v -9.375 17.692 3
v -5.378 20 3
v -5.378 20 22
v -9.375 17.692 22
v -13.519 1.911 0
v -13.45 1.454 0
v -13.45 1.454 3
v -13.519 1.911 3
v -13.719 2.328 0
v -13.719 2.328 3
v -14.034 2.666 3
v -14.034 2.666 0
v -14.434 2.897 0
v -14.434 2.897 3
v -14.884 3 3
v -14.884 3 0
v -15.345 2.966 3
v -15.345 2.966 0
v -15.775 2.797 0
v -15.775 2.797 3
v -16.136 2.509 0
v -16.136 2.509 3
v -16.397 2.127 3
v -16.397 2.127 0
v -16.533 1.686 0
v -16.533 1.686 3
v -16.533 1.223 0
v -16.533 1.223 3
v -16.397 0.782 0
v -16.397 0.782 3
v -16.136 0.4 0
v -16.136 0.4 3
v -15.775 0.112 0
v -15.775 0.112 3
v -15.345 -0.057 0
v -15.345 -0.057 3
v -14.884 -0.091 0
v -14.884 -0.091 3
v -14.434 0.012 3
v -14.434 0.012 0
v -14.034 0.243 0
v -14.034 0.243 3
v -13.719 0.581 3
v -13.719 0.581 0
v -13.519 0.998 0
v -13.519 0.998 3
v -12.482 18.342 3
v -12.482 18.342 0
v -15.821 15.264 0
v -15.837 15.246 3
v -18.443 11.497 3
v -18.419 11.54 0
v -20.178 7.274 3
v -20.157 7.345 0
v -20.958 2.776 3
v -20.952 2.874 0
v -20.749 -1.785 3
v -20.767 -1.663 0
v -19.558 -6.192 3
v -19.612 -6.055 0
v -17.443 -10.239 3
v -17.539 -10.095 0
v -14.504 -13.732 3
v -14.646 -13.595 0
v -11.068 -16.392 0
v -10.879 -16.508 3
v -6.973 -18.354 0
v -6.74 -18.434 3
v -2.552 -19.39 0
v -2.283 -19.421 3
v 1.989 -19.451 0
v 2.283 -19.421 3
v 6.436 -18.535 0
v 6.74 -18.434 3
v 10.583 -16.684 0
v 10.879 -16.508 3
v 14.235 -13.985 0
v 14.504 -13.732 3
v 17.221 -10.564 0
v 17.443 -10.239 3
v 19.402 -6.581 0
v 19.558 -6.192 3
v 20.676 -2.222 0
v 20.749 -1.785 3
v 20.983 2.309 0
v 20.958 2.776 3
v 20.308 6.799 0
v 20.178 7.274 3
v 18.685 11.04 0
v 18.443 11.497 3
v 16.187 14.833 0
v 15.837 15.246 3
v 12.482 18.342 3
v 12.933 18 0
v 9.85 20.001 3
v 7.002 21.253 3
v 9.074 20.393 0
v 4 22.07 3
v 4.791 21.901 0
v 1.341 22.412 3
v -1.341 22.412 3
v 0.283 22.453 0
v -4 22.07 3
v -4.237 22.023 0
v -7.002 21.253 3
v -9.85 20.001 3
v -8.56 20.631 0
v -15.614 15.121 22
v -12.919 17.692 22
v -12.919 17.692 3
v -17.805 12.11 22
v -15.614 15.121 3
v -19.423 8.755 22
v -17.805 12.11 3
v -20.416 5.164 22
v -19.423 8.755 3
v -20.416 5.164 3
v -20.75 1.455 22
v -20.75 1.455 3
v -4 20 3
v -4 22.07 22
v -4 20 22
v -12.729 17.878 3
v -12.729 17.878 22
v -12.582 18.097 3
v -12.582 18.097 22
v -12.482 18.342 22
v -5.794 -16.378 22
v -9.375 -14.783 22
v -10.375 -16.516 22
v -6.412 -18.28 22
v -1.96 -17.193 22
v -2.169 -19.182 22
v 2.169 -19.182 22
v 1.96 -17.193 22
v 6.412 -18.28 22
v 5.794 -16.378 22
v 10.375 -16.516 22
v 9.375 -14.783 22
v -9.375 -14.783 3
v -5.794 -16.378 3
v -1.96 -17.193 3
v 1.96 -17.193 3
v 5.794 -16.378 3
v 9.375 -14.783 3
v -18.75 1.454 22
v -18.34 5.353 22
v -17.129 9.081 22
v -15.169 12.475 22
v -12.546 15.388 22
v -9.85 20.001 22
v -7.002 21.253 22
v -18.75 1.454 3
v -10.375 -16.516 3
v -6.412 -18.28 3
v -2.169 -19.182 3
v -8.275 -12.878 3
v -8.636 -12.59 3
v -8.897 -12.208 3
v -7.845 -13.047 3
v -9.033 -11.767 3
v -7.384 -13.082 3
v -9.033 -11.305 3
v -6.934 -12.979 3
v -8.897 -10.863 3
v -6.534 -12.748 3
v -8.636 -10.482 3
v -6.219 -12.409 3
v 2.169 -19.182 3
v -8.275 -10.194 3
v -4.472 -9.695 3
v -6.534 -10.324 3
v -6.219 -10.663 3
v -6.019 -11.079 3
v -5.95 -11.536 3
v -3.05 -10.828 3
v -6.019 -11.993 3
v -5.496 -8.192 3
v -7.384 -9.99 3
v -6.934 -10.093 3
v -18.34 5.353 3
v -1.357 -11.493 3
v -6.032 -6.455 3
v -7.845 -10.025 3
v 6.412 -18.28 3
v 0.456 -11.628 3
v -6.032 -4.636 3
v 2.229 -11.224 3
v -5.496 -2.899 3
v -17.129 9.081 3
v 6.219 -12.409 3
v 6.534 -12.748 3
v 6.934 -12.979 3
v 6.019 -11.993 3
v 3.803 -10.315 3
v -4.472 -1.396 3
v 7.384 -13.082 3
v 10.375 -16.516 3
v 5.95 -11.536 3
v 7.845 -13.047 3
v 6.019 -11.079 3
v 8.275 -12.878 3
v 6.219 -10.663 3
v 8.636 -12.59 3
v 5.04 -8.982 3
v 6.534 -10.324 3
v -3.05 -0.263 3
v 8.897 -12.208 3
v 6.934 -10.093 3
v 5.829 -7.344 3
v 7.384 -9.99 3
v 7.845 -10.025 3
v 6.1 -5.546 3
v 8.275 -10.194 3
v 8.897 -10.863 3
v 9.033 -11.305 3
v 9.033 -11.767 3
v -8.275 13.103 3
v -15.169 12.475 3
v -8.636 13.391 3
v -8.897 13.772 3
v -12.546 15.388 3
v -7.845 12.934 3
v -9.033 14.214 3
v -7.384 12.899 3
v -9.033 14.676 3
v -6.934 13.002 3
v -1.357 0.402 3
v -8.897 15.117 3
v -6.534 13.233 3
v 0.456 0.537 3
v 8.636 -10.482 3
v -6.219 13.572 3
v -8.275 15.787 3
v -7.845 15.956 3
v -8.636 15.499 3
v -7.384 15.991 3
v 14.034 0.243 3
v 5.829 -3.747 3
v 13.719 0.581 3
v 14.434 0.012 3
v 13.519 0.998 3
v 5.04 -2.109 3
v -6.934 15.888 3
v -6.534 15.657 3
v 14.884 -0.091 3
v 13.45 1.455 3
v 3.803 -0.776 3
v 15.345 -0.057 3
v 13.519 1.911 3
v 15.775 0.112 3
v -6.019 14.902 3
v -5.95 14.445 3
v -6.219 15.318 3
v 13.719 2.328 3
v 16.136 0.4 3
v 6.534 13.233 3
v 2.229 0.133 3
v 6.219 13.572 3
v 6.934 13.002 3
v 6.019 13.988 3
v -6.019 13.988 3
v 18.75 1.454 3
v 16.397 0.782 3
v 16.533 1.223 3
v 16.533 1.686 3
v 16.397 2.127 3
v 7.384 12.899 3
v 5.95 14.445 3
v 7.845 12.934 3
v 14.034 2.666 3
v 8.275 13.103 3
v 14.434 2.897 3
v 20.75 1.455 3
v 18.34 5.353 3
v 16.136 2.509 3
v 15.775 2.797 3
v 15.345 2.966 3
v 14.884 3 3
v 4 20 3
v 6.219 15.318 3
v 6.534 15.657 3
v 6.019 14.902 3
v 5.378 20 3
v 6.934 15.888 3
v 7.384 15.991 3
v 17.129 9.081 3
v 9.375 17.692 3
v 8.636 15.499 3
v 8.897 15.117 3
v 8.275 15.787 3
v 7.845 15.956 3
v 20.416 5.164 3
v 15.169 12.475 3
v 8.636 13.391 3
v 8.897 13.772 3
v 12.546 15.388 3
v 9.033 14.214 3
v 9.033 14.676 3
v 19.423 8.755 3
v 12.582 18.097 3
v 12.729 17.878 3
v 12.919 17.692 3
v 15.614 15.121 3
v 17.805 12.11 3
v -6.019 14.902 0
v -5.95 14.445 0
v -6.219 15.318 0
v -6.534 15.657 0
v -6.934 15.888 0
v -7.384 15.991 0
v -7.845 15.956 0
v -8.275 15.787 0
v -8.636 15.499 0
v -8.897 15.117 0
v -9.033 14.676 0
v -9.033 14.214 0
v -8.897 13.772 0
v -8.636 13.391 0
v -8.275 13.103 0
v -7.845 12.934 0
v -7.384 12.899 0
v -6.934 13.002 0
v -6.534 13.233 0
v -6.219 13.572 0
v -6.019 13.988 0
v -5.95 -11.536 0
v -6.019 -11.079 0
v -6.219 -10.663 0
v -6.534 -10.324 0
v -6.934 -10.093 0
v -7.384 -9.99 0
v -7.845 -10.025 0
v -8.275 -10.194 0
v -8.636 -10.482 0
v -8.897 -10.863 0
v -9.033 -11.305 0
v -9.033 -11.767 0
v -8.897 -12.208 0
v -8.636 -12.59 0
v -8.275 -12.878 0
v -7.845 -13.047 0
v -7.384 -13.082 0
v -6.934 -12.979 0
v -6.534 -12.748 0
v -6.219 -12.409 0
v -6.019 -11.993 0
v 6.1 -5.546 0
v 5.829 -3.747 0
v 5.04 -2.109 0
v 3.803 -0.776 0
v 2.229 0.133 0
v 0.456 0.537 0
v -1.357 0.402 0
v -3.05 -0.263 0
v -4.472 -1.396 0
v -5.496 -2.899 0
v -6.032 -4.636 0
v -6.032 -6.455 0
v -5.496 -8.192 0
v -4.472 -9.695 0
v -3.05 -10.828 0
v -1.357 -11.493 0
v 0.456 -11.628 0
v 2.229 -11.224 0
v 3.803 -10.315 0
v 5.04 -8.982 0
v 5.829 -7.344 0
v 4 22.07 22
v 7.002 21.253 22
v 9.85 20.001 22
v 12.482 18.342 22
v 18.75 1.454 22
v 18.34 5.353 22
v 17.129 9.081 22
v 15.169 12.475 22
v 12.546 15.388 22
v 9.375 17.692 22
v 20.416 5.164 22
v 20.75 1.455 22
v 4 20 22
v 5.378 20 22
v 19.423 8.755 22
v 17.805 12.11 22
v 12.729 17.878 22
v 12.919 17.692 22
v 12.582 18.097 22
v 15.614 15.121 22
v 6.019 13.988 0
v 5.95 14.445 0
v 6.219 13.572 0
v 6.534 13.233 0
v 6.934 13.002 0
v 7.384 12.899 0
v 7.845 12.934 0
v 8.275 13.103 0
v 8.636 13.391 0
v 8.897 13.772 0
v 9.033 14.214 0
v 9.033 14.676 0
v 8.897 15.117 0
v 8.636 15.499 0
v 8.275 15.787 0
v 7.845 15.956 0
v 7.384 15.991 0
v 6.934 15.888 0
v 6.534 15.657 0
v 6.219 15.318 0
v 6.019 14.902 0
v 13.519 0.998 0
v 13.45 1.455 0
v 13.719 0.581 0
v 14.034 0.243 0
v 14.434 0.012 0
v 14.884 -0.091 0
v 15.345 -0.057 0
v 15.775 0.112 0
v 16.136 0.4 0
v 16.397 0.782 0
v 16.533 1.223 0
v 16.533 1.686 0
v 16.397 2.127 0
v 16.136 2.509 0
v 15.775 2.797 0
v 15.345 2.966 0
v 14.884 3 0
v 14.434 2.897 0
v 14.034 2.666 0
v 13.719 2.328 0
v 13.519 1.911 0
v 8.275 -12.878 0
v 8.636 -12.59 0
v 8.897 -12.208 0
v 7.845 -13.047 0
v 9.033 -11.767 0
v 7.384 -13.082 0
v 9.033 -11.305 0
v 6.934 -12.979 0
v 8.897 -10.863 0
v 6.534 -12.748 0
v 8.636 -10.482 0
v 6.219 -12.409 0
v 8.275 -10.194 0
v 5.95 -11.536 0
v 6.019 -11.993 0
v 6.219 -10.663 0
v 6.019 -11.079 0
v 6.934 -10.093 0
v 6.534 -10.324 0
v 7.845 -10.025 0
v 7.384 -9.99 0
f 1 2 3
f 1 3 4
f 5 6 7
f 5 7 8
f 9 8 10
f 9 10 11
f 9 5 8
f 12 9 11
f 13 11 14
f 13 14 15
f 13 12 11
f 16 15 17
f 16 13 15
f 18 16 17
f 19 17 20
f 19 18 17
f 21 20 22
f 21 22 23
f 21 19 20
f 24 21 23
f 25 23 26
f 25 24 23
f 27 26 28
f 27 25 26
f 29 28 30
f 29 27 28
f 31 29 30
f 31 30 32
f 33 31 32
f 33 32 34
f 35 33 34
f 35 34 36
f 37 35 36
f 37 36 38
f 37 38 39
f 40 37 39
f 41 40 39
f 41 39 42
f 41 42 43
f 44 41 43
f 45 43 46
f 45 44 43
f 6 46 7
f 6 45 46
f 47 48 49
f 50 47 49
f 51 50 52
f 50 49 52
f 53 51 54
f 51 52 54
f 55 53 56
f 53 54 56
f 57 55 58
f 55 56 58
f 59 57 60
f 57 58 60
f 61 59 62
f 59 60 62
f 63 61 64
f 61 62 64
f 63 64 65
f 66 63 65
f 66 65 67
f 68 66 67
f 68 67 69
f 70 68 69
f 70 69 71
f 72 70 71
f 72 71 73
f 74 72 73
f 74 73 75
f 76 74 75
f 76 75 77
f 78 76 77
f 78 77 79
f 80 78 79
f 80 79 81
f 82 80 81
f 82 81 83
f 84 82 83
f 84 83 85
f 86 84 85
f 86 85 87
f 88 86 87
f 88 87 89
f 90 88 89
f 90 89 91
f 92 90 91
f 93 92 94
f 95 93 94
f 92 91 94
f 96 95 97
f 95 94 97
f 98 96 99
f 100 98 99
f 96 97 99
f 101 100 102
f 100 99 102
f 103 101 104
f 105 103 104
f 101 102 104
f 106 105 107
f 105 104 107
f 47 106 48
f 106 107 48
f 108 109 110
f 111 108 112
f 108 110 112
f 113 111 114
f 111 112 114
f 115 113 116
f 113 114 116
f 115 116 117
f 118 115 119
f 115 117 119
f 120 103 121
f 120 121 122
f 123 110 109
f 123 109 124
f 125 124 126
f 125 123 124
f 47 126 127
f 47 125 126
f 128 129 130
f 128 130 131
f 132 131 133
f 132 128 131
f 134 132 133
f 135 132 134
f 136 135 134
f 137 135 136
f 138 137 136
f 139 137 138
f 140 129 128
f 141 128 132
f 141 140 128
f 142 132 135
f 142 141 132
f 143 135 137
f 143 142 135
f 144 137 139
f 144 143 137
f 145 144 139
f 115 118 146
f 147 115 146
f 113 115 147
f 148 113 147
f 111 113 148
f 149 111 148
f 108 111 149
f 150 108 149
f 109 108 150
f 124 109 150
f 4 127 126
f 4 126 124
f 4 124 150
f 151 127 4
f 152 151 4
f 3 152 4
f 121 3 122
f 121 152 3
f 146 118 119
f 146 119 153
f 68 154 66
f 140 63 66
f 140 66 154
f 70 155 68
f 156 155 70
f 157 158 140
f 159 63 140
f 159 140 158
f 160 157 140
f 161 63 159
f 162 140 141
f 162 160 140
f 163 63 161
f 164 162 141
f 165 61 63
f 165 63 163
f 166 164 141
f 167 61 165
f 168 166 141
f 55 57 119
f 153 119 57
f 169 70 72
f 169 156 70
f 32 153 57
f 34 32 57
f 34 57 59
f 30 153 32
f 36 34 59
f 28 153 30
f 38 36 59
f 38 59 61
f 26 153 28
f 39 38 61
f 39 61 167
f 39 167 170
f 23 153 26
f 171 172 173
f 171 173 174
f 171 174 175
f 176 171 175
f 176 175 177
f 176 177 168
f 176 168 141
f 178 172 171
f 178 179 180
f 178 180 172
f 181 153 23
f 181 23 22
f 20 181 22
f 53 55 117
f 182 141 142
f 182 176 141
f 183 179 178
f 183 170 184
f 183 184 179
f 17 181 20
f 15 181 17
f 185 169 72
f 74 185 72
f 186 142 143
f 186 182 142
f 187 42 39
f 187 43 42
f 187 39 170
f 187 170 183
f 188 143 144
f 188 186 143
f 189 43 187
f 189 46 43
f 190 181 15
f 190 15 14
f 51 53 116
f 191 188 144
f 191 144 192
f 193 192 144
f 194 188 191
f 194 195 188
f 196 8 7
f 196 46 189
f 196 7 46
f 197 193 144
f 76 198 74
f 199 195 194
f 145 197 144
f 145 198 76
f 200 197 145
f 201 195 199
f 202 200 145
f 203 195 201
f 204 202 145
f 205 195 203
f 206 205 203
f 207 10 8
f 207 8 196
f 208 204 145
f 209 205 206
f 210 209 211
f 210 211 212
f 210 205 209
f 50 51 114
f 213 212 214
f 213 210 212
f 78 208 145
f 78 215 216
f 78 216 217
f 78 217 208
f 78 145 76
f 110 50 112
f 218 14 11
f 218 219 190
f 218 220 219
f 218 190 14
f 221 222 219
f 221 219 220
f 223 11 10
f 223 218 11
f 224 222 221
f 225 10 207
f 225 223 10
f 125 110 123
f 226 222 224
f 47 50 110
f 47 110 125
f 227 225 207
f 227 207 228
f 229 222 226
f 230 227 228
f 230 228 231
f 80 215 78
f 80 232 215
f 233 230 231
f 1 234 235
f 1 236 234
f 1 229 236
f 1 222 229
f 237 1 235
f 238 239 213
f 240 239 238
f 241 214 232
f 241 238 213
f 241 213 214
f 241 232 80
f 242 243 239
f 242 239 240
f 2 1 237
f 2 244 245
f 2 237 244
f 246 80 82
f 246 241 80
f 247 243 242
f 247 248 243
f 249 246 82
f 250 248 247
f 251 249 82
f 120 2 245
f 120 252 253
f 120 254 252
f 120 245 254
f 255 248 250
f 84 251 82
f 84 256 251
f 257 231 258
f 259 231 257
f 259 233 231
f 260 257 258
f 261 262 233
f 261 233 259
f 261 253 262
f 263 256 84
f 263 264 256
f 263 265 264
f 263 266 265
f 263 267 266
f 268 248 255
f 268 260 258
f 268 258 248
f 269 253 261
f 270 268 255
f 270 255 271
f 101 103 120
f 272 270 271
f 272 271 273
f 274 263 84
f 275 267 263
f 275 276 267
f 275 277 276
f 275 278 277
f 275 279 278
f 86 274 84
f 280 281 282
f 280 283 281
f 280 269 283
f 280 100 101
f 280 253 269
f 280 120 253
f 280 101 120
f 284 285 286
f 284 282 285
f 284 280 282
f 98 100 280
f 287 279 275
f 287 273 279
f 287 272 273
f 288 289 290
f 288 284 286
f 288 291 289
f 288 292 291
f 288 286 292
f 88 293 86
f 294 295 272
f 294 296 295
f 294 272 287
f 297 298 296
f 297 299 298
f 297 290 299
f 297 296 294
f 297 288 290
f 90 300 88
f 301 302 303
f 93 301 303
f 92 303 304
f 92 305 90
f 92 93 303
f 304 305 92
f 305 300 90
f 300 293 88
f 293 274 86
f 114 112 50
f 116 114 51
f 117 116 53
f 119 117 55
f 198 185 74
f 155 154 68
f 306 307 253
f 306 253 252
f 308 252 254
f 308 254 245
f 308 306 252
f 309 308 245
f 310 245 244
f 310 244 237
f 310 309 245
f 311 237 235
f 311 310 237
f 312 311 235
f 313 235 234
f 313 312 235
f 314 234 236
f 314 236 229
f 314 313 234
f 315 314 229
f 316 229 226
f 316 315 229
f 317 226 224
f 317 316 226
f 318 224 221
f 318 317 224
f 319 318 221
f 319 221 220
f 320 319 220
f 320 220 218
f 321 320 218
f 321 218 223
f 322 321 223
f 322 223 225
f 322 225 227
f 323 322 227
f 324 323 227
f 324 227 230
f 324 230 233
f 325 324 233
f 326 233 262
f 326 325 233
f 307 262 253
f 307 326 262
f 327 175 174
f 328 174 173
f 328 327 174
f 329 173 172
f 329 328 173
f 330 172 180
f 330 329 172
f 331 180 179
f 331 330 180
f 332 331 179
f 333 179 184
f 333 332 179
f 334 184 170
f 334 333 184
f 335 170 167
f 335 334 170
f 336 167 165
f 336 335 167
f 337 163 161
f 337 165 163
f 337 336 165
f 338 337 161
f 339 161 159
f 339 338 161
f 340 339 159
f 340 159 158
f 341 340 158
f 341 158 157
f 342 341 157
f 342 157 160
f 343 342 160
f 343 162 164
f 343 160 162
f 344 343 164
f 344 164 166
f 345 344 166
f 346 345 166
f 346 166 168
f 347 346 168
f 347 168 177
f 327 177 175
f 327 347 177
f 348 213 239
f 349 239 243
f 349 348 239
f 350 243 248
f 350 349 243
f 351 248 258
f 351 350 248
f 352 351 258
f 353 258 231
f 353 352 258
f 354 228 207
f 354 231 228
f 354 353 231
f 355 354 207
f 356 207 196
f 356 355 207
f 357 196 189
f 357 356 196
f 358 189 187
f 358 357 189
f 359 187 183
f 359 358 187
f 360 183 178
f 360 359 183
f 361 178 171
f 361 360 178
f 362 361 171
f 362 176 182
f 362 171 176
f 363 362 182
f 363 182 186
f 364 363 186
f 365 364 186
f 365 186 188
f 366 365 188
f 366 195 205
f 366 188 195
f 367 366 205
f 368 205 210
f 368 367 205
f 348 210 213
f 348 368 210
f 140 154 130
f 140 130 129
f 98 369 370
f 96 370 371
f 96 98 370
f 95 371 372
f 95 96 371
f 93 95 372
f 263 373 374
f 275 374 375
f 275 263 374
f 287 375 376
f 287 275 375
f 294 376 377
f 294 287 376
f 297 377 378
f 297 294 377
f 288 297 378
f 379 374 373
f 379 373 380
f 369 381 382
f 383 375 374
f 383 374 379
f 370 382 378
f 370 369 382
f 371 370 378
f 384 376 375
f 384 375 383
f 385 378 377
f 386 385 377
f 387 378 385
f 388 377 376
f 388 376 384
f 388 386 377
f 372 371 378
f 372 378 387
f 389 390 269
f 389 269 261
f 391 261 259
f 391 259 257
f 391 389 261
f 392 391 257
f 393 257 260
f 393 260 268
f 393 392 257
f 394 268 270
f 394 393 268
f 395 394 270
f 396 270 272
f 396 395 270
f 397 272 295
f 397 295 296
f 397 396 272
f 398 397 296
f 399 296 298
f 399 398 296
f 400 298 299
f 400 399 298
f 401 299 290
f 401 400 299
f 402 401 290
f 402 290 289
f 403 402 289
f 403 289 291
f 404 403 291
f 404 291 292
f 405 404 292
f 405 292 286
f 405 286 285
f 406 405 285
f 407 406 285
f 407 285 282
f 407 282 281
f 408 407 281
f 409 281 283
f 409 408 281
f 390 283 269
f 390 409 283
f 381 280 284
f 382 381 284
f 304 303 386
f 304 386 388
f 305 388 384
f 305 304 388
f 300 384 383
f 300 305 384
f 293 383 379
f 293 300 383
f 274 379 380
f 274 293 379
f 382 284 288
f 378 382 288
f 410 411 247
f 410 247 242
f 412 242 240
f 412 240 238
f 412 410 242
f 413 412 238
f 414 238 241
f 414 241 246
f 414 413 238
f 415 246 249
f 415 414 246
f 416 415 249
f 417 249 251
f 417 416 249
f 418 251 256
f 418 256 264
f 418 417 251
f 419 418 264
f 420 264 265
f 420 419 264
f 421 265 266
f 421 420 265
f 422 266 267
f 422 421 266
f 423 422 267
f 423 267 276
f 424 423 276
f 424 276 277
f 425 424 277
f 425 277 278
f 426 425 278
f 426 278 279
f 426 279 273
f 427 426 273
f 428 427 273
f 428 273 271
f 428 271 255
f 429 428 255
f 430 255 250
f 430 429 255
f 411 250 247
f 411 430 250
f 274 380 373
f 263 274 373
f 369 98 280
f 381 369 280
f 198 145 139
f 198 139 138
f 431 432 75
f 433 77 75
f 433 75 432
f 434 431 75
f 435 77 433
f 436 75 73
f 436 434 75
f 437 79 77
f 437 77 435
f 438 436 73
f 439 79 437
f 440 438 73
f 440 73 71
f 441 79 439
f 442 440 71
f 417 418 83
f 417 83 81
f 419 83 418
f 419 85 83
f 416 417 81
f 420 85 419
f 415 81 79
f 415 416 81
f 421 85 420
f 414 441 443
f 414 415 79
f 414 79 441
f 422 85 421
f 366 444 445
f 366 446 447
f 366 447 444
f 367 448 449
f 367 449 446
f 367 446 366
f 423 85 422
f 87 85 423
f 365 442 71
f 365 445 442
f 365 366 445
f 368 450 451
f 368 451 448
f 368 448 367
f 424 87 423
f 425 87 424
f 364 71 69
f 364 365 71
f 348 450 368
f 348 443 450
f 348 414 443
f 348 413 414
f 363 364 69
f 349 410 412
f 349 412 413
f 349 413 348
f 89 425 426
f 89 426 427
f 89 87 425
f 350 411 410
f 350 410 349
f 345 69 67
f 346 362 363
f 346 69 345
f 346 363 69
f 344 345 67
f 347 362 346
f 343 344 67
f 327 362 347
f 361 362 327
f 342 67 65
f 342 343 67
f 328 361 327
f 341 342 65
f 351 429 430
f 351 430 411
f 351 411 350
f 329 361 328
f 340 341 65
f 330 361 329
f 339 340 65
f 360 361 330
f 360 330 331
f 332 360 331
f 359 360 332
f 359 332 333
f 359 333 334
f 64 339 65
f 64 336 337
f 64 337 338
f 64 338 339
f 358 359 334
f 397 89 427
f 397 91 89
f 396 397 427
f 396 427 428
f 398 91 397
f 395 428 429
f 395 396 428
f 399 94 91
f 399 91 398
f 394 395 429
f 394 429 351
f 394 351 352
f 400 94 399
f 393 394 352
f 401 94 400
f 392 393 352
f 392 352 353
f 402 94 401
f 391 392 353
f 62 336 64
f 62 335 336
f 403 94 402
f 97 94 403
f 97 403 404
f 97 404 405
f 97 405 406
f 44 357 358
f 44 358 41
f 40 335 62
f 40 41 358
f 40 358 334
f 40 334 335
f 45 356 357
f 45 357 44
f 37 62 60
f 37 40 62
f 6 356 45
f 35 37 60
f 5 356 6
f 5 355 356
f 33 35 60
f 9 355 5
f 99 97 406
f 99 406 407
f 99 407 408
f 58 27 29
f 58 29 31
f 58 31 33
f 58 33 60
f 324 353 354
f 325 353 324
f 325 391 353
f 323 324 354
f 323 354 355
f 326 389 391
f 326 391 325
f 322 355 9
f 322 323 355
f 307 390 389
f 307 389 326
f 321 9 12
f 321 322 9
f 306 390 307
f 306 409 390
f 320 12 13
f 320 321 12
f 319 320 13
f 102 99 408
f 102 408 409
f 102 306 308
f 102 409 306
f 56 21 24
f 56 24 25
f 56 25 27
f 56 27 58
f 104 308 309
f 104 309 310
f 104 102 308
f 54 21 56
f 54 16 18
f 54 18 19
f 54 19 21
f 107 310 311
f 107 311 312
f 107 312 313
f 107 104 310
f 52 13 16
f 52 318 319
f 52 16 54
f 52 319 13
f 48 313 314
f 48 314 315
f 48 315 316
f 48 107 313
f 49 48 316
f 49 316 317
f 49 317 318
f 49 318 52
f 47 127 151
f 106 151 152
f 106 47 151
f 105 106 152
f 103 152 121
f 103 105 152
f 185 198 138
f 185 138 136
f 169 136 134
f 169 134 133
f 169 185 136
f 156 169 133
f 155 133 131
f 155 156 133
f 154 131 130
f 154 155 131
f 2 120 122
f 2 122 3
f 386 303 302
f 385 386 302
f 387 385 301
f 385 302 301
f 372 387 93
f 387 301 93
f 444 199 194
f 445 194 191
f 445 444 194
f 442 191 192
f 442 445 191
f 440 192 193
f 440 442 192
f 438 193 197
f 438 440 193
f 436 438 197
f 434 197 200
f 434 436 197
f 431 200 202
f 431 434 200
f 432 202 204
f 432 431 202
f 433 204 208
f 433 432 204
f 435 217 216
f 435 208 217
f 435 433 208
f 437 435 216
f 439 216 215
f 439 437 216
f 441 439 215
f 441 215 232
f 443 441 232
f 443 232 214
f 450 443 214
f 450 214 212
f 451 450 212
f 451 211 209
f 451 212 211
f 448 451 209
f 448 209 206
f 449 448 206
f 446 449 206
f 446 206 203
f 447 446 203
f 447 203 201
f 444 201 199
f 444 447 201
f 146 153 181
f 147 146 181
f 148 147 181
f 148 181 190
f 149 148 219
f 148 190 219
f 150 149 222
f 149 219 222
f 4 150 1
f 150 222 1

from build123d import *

# Parameters (mm, degrees)
SKETCH1_R           = 2.5
SKETCH1_R_2         = 6.1
SKETCH1_R_3         = 1.55
BOSS_EXTRUDE1_DEPTH = 3
BOSS_EXTRUDE2_DEPTH = 39
BOSS_EXTRUDE3_DEPTH = 39
CUT_EXTRUDE1_DEPTH  = 3
BOSS_EXTRUDE4_DEPTH = 34
BOSS_EXTRUDE5_DEPTH = 3
CUT_EXTRUDE3_DEPTH  = 77.336426429
CUT_EXTRUDE4_START  = -10
SKETCH9_W           = 115.741675956
SKETCH9_H           = 76.731693644
SKETCH9_R           = 21
CUT_EXTRUDE4_DEPTH  = 10
SKETCH10_W          = 52.464416267
SKETCH10_H          = 51.664843315
CUT_EXTRUDE5_DEPTH  = 20


with BuildPart() as part:
    # Sketch1 → Boss-Extrude1 (new body)
    with BuildSketch(Plane.XY):
        with BuildLine():
            Line((-48.416861363, 3.650350453), (-11.959014769, 37.776226585))
            ThreePointArc((-11.959014769, 37.776226585), (0, 42.5), (11.959014769, 37.776226585))
            Line((11.959014769, 37.776226585), (48.416861363, 3.650350453))
            ThreePointArc((48.416861363, 3.650350453), (49.946989961, -0.726147591), (47.22369092, -4.478303104))
            Line((47.22369092, -4.478303104), (17.66776819, -19.154227328))
            ThreePointArc((17.66776819, -19.154227328), (16.856525691, -19.446371641), (16, -19.5455))
            Line((16, -19.5455), (-16, -19.5455))
            ThreePointArc((-16, -19.5455), (-16.856525691, -19.446371641), (-17.66776819, -19.154227328))
            Line((-17.66776819, -19.154227328), (-47.22369092, -4.478303104))
            ThreePointArc((-47.22369092, -4.478303104), (-49.946989961, -0.726147591), (-48.416861363, 3.650350453))
        make_face()
        with Locations((-25, 0)):
            Circle(SKETCH1_R, mode=Mode.SUBTRACT)
        with Locations((0, -5.5455)):
            Circle(SKETCH1_R_2, mode=Mode.SUBTRACT)
        with Locations((-7.5, 14.444881057)):
            Circle(SKETCH1_R_3, mode=Mode.SUBTRACT)
        with Locations((-15, 1.4545)):
            Circle(SKETCH1_R_3, mode=Mode.SUBTRACT)
        with Locations((-7.5, -11.535881057)):
            Circle(SKETCH1_R_3, mode=Mode.SUBTRACT)
        with Locations(Location((7.5, -11.535881057, 0), (0, 0, 180))):
            Circle(SKETCH1_R_3, mode=Mode.SUBTRACT)
        with Locations(Location((7.5, 14.444881057, 0), (0, 0, 180))):
            Circle(SKETCH1_R_3, mode=Mode.SUBTRACT)
        with Locations(Location((15, 1.4545, 0), (0, 0, 180))):
            Circle(SKETCH1_R_3, mode=Mode.SUBTRACT)
        with Locations(Location((25, 0, 0), (0, 0, 180))):
            Circle(SKETCH1_R, mode=Mode.SUBTRACT)
        with Locations((-45, 0)):
            Circle(SKETCH1_R, mode=Mode.SUBTRACT)
        with Locations(Location((45, 0, 0), (0, 0, 180))):
            Circle(SKETCH1_R, mode=Mode.SUBTRACT)
        with Locations((-16, -15.7955)):
            Circle(SKETCH1_R, mode=Mode.SUBTRACT)
        with Locations(Location((16, -15.7955, 0), (0, 0, 180))):
            Circle(SKETCH1_R, mode=Mode.SUBTRACT)
    extrude(amount=BOSS_EXTRUDE1_DEPTH)

    # Sketch2 → Boss-Extrude2 (add)
    with BuildSketch(Plane.XY.offset(3)):
        with BuildLine():
            Line((-20.75, 1.4545), (-18.75, 1.4545))
            ThreePointArc((-18.75, 1.4545), (-16.237976321, 10.8295), (-9.375, 17.692476321))
            Line((-9.375, 17.692476321), (-10.375, 19.424527129))
            ThreePointArc((-10.375, 19.424527129), (-17.970027129, 11.8295), (-20.75, 1.4545))
        make_face()
        with BuildLine():
            Line((-10.375, -16.515527129), (-9.375, -14.783476321))
            ThreePointArc((-9.375, -14.783476321), (0, -17.2955), (9.375, -14.783476321))
            Line((9.375, -14.783476321), (10.375, -16.515527129))
            ThreePointArc((10.375, -16.515527129), (0, -19.2955), (-10.375, -16.515527129))
        make_face()
        with BuildLine():
            ThreePointArc((18.75, 1.4545), (16.237976321, 10.8295), (9.375, 17.692476321))
            Line((9.375, 17.692476321), (10.375, 19.424527129))
            ThreePointArc((10.375, 19.424527129), (17.970027129, 11.8295), (20.75, 1.4545))
            Line((20.75, 1.4545), (18.75, 1.4545))
        make_face()
    extrude(amount=BOSS_EXTRUDE2_DEPTH)

    # Sketch3 → Boss-Extrude3 (add)
    with BuildSketch(Plane.XY.offset(3)):
        with BuildLine():
            Line((-17.5, 29), (-17.5, 23))
            Line((-17.5, 23), (-4, 23))
            Line((-4, 23), (-4, 20))
            Line((-4, 20), (-5.378251748, 20))
            Line((-5.378251748, 20), (-9.375, 17.692476321))
            Line((-9.375, 17.692476321), (-12.918615444, 17.692476321))
            ThreePointArc((-12.918615444, 17.692476321), (-12.502444344, 19.132335325), (-13.724553319, 20))
            Line((-13.724553319, 20), (-20.5, 20))
            Line((-20.5, 20), (-20.5, 29))
            Line((-20.5, 29), (-17.5, 29))
        make_face()
    boss_extrude3 = extrude(amount=BOSS_EXTRUDE3_DEPTH)

    # Mirror1: Boss-Extrude3 across plane
    add(boss_extrude3.mirror(Plane(origin=(0, 0, 0), x_dir=(0, 0, 1), z_dir=(1, 0, 0))))

    # Sketch4 → Cut-Extrude1 (cut)
    with BuildSketch(Plane(origin=(0, 23, 0), x_dir=(1, 0, 0), z_dir=(0, 1, 0))):
        with BuildLine():
            Line((-14.224553319, -17.5), (-14.224553319, -27.5))
            ThreePointArc((-14.224553319, -27.5), (-15.724553319, -29), (-17.224553319, -27.5))
            Line((-17.224553319, -27.5), (-17.224553319, -17.5))
            ThreePointArc((-17.224553319, -17.5), (-15.724553319, -16), (-14.224553319, -17.5))
        make_face()
        with BuildLine():
            Line((14.224553319, -17.5), (14.224553319, -27.5))
            ThreePointArc((14.224553319, -27.5), (15.724553319, -29), (17.224553319, -27.5))
            Line((17.224553319, -27.5), (17.224553319, -17.5))
            ThreePointArc((17.224553319, -17.5), (15.724553319, -16), (14.224553319, -17.5))
        make_face()
    extrude(amount=-CUT_EXTRUDE1_DEPTH, mode=Mode.SUBTRACT)

    # Sketch5 → Boss-Extrude4 (add)
    with BuildSketch(Plane.XY.offset(3)):
        Polygon((-43.784396435, 23.346849864), (-43.784396435, 6.040412882), (-29.176551712, -7.739510205), (-18.086117895, -7.739510205), (-18.086117895, -4.739510205), (-27.984845454, -4.739510205), (-40.784396435, 7.334606915), (-40.784396435, 23.346849864), align=None)
    boss_extrude4 = extrude(amount=BOSS_EXTRUDE4_DEPTH)

    # Mirror2: Boss-Extrude4 across plane
    add(boss_extrude4.mirror(Plane(origin=(0, 0, 0), x_dir=(0, 0, 1), z_dir=(1, 0, 0))))

    # Sketch6 → Boss-Extrude5 (add)
    with BuildSketch(Plane(origin=(0, 0, 3), x_dir=(-1, 0, 0), z_dir=(0, 0, -1))):
        Polygon((40.784396435, 23.346849864), (40.784396435, 10.794616422), (43.784396435, 7.986506839), (43.784396435, 23.346849864), align=None)
        Polygon((-43.784396435, 23.346849864), (-43.784396435, 7.986506839), (-40.784396435, 10.794616422), (-40.784396435, 23.346849864), align=None)
    extrude(amount=BOSS_EXTRUDE5_DEPTH)

    # Sketch8 → Cut-Extrude3 (cut, through all)
    with BuildSketch(Plane.XY.offset(3)):
        with BuildLine():
            Line((50.685566108, 53.585257373), (-51.78645156, 53.585257373))
            Line((-51.78645156, 53.585257373), (-51.78645156, -24.701187201))
            Line((-51.78645156, -24.701187201), (50.685566108, -24.701187201))
            Line((50.685566108, -24.701187201), (50.685566108, -10.970768248))
            Line((50.685566108, -10.970768248), (16.929639954, -10.970768248))
            ThreePointArc((16.929639954, -10.970768248), (0, -19.5455), (-16.929639954, -10.970768248))
            Line((-16.929639954, -10.970768248), (-24.865040571, -10.970768248))
            Line((-24.865040571, -10.970768248), (-24.865040571, -1.968887806))
            Line((-24.865040571, -1.968887806), (-20.719083376, -1.968887806))
            ThreePointArc((-20.719083376, -1.968887806), (-1.717447104, 22.384153018), (21, 1.4545))
            ThreePointArc((21, 1.4545), (20.929653018, -0.262947104), (20.719083376, -1.968887806))
            Line((20.719083376, -1.968887806), (50.685566108, -1.968887806))
            Line((50.685566108, -1.968887806), (50.685566108, 53.585257373))
        make_face()
        with BuildLine():
            ThreePointArc((16.929639954, -10.970768248), (19.354974941, -6.693195689), (20.719083376, -1.968887806))
            Line((20.719083376, -1.968887806), (-20.719083376, -1.968887806))
            ThreePointArc((-20.719083376, -1.968887806), (-19.354974941, -6.693195689), (-16.929639954, -10.970768248))
            Line((-16.929639954, -10.970768248), (16.929639954, -10.970768248))
        make_face()
        with BuildLine():
            ThreePointArc((-16.929639954, -10.970768248), (-19.354974941, -6.693195689), (-20.719083376, -1.968887806))
            Line((-20.719083376, -1.968887806), (-24.865040571, -1.968887806))
            Line((-24.865040571, -1.968887806), (-24.865040571, -10.970768248))
            Line((-24.865040571, -10.970768248), (-16.929639954, -10.970768248))
        make_face()
        with BuildLine():
            Line((50.685566108, -10.970768248), (50.685566108, -1.968887806))
            Line((50.685566108, -1.968887806), (20.719083376, -1.968887806))
            ThreePointArc((20.719083376, -1.968887806), (19.354974941, -6.693195689), (16.929639954, -10.970768248))
            Line((16.929639954, -10.970768248), (50.685566108, -10.970768248))
        make_face()
    extrude(amount=CUT_EXTRUDE3_DEPTH, mode=Mode.SUBTRACT)

    # Sketch9 → Cut-Extrude4 (cut)
    with BuildSketch(Plane.XY.offset(3).offset(CUT_EXTRUDE4_START)):
        with Locations((-2.250274658, 10.895525105)):
            Rectangle(SKETCH9_W, SKETCH9_H)
        with Locations(Location((0, 1.4545, 0), (0, 0, 126.468628992))):
            Circle(SKETCH9_R, mode=Mode.SUBTRACT)
    extrude(amount=CUT_EXTRUDE4_DEPTH, mode=Mode.SUBTRACT)

    # Sketch10 → Cut-Extrude5 (cut)
    with BuildSketch(Plane.XY.offset(42)):
        with Locations((-1.737703473, -0.030968104)):
            Rectangle(SKETCH10_W, SKETCH10_H)
    extrude(amount=-CUT_EXTRUDE5_DEPTH, mode=Mode.SUBTRACT)


solid = part.part
